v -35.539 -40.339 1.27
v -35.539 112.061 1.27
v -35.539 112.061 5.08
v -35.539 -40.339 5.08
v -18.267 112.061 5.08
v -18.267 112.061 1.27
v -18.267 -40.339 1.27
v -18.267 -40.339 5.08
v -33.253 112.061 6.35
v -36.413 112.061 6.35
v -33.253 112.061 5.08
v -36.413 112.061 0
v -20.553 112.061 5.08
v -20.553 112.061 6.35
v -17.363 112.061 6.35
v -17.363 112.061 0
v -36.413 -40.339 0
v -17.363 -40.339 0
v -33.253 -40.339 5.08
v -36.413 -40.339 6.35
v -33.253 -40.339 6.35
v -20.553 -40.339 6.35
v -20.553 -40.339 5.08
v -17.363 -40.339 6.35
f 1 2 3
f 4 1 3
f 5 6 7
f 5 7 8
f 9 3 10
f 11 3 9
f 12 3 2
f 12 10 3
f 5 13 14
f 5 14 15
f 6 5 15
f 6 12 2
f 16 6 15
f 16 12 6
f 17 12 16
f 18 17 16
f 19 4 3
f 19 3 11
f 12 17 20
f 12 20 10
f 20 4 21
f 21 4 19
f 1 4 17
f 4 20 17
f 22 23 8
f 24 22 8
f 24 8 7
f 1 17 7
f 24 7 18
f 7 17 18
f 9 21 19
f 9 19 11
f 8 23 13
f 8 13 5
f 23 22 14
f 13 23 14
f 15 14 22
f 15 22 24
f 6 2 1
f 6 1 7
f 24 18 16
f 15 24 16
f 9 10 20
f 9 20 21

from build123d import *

# Parameters (mm, degrees)
F0_W     = 19.05
F0_H     = 152.4
F1_DEPTH = 6.35
F2_W     = 12.7
F2_H     = 152.4
F3_DEPTH = 5.08
F4_W     = 2.286
F4_H     = 3.81
F5_DEPTH = 152.4


with BuildPart() as f1:
    # F0 (on Top) → F1 (new body)
    with BuildSketch(Plane.XY):
        with Locations((-26.88839, 35.860999)):
            Rectangle(F0_W, F0_H)
    extrude(amount=F1_DEPTH)

    # F2 (on face) → F3 (cut)
    with BuildSketch(Plane.XY.offset(6.35)):
        with Locations((-26.903349, 35.860999)):
            Rectangle(F2_W, F2_H)
    extrude(amount=-F3_DEPTH, mode=Mode.SUBTRACT)

    # F4 (on face) → F5 (cut)
    with BuildSketch(Plane.XZ.offset(40.339001)):
        with Locations((-34.396349, 3.175)):
            Rectangle(F4_W, F4_H)
        with Locations((-19.410349, 3.175)):
            Rectangle(F4_W, F4_H)
    extrude(amount=-F5_DEPTH, mode=Mode.SUBTRACT)


solid = f1.part
